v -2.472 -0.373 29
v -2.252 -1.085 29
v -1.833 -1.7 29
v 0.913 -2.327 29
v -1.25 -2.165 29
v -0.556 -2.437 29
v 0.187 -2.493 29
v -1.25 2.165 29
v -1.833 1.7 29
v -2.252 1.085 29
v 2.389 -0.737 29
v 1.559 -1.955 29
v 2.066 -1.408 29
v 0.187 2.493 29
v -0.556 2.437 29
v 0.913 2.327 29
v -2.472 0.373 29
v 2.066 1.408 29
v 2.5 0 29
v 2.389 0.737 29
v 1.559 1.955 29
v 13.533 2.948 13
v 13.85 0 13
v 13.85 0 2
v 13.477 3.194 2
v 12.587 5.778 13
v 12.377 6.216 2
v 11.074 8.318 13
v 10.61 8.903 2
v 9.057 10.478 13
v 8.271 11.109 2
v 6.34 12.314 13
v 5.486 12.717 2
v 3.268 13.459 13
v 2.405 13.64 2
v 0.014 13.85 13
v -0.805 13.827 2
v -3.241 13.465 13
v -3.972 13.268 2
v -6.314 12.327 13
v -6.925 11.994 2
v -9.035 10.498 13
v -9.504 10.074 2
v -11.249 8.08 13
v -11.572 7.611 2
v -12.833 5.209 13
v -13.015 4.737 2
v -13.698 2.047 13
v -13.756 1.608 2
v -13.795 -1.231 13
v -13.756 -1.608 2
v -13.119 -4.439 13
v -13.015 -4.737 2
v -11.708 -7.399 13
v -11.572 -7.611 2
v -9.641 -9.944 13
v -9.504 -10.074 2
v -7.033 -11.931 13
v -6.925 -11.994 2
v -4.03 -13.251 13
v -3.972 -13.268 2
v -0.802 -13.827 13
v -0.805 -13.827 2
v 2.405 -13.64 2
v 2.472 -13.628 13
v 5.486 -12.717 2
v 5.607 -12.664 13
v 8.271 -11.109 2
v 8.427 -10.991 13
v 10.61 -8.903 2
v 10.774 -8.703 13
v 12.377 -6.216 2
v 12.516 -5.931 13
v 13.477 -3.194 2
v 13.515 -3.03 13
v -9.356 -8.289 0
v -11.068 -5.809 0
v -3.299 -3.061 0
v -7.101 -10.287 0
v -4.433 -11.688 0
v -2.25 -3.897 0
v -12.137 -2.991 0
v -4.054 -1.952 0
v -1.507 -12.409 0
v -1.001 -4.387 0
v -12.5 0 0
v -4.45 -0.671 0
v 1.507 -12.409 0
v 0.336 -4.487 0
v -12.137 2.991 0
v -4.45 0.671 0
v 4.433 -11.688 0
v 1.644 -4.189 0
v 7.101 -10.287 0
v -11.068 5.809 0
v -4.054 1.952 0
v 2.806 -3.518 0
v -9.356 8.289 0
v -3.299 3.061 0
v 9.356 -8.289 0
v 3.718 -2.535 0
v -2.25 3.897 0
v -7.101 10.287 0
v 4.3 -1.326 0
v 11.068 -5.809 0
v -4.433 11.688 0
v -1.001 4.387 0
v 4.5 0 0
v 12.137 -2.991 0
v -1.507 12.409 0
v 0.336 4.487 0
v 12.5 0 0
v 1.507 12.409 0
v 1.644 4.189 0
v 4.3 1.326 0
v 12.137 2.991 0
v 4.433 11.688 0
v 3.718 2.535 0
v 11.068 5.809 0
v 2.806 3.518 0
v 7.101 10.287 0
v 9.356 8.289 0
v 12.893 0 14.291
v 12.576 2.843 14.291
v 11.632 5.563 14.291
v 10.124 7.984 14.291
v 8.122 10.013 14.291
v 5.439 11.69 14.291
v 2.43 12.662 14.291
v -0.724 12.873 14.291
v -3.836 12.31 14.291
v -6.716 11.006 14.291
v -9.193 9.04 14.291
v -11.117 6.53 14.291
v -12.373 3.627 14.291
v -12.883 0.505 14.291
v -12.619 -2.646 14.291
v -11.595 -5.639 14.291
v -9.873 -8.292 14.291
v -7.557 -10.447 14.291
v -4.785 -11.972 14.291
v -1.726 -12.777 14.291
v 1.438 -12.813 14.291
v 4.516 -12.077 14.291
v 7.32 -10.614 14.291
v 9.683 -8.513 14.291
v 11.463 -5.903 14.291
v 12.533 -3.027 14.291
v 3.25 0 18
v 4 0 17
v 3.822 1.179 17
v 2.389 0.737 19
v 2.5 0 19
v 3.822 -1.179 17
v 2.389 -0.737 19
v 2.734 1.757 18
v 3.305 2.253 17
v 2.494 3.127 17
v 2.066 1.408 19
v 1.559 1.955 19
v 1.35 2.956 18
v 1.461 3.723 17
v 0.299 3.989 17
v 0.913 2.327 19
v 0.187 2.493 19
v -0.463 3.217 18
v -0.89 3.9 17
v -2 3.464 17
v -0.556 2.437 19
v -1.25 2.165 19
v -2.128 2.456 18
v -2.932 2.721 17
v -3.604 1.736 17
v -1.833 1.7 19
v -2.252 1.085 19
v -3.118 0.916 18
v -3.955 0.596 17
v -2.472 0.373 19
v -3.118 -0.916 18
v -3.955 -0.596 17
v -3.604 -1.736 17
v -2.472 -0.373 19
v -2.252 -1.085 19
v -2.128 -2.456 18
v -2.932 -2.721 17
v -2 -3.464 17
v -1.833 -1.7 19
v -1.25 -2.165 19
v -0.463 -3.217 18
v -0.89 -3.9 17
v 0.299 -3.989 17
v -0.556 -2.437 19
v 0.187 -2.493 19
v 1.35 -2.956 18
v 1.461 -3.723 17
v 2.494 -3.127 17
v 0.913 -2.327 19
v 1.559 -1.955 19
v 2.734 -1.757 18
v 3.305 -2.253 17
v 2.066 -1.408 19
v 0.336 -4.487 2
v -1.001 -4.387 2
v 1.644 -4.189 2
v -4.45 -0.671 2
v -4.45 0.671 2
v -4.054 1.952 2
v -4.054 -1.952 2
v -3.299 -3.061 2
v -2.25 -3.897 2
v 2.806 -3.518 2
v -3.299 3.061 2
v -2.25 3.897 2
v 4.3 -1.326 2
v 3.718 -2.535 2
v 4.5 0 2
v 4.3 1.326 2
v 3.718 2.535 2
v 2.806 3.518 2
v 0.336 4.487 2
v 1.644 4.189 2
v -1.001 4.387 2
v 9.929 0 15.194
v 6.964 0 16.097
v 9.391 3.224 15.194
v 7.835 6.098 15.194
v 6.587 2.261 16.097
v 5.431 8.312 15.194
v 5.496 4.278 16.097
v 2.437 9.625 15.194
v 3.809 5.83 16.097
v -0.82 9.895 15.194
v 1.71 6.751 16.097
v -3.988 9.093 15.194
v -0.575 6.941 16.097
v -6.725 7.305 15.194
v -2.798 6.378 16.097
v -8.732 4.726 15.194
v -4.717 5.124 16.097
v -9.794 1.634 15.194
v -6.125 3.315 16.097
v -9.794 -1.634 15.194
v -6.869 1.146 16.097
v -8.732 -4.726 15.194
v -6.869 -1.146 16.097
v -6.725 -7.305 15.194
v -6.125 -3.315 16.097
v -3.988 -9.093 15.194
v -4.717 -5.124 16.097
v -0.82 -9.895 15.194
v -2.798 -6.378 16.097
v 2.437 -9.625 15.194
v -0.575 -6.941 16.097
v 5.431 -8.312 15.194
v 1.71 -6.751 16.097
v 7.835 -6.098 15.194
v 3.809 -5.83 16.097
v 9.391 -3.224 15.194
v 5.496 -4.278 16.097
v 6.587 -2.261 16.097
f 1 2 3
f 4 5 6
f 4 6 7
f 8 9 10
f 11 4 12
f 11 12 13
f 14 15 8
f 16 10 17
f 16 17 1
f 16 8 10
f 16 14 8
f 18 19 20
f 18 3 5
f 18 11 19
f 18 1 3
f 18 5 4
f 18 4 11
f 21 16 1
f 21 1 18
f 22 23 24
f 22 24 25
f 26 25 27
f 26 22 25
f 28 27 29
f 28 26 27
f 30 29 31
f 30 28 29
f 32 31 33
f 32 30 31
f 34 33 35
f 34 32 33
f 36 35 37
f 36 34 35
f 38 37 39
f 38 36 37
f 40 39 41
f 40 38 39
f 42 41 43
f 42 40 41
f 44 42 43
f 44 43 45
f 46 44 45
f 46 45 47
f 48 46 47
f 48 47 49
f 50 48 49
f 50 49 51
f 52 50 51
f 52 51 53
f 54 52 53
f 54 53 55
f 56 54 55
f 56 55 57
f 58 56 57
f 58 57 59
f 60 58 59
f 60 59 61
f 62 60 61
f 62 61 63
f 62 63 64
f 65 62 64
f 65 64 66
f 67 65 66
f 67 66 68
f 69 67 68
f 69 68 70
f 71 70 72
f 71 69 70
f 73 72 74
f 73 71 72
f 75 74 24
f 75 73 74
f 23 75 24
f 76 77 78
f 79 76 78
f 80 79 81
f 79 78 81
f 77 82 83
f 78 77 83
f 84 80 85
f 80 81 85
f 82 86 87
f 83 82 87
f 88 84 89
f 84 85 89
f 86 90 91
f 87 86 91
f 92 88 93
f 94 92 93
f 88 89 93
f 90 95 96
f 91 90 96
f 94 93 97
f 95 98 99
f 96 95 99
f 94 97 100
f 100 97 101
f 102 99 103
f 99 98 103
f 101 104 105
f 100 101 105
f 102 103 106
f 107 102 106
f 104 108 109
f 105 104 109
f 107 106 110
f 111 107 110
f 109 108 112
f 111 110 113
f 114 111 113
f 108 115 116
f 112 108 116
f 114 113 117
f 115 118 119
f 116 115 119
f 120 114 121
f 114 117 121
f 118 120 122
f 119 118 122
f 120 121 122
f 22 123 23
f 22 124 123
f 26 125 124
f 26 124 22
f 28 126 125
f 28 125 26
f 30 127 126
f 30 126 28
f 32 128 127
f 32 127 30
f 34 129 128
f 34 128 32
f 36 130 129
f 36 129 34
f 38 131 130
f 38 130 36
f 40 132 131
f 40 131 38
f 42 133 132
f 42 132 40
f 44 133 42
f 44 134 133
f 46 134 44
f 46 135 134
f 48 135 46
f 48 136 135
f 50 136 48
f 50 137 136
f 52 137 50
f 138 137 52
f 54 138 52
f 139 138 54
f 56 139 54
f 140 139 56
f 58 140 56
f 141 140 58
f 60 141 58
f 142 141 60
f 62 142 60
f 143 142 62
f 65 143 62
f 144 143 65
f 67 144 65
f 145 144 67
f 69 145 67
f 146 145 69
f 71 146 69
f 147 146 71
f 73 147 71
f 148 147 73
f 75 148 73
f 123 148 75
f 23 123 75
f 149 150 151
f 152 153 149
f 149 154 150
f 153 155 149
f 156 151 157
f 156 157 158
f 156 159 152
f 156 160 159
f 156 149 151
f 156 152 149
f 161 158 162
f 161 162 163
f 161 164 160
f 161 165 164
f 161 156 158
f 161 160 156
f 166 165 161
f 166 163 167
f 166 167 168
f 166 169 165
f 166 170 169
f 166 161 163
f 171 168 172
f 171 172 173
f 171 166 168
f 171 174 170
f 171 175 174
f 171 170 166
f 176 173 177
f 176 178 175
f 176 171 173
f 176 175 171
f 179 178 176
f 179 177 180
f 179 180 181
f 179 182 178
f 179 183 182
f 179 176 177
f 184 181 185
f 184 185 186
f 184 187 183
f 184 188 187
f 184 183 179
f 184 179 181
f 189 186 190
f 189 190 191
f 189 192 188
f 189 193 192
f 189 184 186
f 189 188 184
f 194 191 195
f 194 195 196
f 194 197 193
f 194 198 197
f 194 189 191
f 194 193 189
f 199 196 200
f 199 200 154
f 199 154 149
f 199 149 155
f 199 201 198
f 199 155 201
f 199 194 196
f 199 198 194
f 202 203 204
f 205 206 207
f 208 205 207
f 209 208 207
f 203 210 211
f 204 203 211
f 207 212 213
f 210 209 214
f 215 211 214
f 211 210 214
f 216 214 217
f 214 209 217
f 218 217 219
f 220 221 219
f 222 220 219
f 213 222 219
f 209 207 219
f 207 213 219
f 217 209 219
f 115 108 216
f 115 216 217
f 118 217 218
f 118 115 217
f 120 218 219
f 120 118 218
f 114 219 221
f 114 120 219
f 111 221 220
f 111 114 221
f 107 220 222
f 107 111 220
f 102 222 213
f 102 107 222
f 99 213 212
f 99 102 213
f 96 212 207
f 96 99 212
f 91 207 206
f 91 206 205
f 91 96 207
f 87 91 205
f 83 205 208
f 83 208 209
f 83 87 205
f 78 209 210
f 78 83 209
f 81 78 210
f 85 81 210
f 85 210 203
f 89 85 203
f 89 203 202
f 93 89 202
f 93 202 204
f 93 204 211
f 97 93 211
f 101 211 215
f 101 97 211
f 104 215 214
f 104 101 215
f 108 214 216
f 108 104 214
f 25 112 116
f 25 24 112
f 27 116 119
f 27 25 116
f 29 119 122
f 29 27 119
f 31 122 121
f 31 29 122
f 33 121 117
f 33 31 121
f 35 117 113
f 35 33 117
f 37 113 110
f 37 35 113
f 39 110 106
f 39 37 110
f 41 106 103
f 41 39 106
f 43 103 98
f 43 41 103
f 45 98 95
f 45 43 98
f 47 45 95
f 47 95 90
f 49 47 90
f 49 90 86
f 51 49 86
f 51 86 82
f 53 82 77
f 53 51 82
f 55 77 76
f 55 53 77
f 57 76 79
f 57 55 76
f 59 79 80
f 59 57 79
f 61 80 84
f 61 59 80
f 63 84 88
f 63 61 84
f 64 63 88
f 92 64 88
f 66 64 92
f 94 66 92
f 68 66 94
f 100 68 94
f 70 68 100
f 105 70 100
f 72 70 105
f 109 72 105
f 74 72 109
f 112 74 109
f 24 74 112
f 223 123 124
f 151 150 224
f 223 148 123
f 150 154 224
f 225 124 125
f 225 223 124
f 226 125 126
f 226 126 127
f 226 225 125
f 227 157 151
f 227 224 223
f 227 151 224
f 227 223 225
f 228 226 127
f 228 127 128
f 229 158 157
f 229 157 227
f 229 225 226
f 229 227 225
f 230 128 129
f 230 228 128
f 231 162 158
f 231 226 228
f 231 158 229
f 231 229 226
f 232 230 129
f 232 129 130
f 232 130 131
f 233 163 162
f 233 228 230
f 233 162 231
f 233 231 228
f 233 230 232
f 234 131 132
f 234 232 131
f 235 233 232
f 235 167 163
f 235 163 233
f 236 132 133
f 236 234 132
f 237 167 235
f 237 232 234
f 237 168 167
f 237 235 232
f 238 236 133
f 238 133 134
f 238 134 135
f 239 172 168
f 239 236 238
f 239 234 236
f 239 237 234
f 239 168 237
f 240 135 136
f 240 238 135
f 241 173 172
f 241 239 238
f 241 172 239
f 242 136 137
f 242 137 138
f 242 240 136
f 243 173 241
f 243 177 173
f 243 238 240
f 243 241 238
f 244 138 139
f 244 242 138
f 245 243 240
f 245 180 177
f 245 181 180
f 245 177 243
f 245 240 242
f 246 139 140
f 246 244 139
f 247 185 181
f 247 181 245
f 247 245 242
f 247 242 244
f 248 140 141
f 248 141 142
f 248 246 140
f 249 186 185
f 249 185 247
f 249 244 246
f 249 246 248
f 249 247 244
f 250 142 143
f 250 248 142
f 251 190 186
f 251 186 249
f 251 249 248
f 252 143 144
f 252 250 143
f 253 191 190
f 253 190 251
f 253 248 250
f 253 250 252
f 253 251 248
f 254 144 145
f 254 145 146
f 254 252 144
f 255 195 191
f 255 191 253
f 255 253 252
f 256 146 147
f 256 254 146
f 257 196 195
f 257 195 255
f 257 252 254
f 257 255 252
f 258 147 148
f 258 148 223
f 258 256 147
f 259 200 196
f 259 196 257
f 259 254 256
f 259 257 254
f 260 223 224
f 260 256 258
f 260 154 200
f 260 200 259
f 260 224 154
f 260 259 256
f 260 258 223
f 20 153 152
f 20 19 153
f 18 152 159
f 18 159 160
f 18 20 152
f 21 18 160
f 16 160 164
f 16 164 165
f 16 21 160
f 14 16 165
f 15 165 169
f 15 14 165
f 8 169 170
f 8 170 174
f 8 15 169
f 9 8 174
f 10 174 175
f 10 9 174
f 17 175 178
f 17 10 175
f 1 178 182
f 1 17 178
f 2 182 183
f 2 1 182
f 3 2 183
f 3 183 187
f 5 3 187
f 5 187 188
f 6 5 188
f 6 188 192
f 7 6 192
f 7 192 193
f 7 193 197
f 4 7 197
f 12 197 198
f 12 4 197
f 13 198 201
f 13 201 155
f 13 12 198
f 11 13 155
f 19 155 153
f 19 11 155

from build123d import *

# Parameters (mm, degrees)
F5_R       = 12.5
F6_R       = 13.85
F11_FACE_R = 13.85
F7_R       = 13.85
F12_FACE_R = 13.85
F9_R       = 4
F13_FACE_R = 4
F8_R       = 2.5
F14_FACE_R = 2.5
F10_R      = 2.5
F16_SIZE   = 1
F17_R      = 4.5
F18_DEPTH  = 2


with BuildPart() as f11:
    # F5 (on Top) → F11 section 0
    with BuildSketch(Plane.XY):
        Circle(F5_R)
    # F6 (on offset) → F11 section 1
    with BuildSketch(Plane.XY.offset(2)):
        Circle(F6_R)
    loft()

    # F11_face (on face) → F12 section 0
    with BuildSketch(Plane.XY.offset(2)):
        Circle(F11_FACE_R)
    # F7 (on offset) → F12 section 1
    with BuildSketch(Plane.XY.offset(14)):
        Circle(F7_R)
    loft()

    # F12_face (on face) → F13 section 0
    with BuildSketch(Plane.XY.offset(14)):
        Circle(F12_FACE_R)
    # F9 (on offset) → F13 section 1
    with BuildSketch(Plane.XY.offset(17)):
        Circle(F9_R)
    loft()

    # F13_face (on face) → F14 section 0
    with BuildSketch(Plane.XY.offset(17)):
        Circle(F13_FACE_R)
    # F8 (on offset) → F14 section 1
    with BuildSketch(Plane.XY.offset(19)):
        Circle(F8_R)
    loft()

    # F14_face (on face) → F15 section 0
    with BuildSketch(Plane.XY.offset(19)):
        Circle(F14_FACE_R)
    # F10 (on offset) → F15 section 1
    with BuildSketch(Plane.XY.offset(29)):
        Circle(F10_R)
    loft()

    # F16
    f16_edges = [f11.edges().sort_by_distance(p)[0] for p in [
        (-13.85, 0, 14),
    ]]
    chamfer(f16_edges, length=F16_SIZE)

    # F17 (on Top) → F18 (cut)
    with BuildSketch(Plane.XY):
        Circle(F17_R)
    extrude(amount=F18_DEPTH, mode=Mode.SUBTRACT)


solid = f11.part
